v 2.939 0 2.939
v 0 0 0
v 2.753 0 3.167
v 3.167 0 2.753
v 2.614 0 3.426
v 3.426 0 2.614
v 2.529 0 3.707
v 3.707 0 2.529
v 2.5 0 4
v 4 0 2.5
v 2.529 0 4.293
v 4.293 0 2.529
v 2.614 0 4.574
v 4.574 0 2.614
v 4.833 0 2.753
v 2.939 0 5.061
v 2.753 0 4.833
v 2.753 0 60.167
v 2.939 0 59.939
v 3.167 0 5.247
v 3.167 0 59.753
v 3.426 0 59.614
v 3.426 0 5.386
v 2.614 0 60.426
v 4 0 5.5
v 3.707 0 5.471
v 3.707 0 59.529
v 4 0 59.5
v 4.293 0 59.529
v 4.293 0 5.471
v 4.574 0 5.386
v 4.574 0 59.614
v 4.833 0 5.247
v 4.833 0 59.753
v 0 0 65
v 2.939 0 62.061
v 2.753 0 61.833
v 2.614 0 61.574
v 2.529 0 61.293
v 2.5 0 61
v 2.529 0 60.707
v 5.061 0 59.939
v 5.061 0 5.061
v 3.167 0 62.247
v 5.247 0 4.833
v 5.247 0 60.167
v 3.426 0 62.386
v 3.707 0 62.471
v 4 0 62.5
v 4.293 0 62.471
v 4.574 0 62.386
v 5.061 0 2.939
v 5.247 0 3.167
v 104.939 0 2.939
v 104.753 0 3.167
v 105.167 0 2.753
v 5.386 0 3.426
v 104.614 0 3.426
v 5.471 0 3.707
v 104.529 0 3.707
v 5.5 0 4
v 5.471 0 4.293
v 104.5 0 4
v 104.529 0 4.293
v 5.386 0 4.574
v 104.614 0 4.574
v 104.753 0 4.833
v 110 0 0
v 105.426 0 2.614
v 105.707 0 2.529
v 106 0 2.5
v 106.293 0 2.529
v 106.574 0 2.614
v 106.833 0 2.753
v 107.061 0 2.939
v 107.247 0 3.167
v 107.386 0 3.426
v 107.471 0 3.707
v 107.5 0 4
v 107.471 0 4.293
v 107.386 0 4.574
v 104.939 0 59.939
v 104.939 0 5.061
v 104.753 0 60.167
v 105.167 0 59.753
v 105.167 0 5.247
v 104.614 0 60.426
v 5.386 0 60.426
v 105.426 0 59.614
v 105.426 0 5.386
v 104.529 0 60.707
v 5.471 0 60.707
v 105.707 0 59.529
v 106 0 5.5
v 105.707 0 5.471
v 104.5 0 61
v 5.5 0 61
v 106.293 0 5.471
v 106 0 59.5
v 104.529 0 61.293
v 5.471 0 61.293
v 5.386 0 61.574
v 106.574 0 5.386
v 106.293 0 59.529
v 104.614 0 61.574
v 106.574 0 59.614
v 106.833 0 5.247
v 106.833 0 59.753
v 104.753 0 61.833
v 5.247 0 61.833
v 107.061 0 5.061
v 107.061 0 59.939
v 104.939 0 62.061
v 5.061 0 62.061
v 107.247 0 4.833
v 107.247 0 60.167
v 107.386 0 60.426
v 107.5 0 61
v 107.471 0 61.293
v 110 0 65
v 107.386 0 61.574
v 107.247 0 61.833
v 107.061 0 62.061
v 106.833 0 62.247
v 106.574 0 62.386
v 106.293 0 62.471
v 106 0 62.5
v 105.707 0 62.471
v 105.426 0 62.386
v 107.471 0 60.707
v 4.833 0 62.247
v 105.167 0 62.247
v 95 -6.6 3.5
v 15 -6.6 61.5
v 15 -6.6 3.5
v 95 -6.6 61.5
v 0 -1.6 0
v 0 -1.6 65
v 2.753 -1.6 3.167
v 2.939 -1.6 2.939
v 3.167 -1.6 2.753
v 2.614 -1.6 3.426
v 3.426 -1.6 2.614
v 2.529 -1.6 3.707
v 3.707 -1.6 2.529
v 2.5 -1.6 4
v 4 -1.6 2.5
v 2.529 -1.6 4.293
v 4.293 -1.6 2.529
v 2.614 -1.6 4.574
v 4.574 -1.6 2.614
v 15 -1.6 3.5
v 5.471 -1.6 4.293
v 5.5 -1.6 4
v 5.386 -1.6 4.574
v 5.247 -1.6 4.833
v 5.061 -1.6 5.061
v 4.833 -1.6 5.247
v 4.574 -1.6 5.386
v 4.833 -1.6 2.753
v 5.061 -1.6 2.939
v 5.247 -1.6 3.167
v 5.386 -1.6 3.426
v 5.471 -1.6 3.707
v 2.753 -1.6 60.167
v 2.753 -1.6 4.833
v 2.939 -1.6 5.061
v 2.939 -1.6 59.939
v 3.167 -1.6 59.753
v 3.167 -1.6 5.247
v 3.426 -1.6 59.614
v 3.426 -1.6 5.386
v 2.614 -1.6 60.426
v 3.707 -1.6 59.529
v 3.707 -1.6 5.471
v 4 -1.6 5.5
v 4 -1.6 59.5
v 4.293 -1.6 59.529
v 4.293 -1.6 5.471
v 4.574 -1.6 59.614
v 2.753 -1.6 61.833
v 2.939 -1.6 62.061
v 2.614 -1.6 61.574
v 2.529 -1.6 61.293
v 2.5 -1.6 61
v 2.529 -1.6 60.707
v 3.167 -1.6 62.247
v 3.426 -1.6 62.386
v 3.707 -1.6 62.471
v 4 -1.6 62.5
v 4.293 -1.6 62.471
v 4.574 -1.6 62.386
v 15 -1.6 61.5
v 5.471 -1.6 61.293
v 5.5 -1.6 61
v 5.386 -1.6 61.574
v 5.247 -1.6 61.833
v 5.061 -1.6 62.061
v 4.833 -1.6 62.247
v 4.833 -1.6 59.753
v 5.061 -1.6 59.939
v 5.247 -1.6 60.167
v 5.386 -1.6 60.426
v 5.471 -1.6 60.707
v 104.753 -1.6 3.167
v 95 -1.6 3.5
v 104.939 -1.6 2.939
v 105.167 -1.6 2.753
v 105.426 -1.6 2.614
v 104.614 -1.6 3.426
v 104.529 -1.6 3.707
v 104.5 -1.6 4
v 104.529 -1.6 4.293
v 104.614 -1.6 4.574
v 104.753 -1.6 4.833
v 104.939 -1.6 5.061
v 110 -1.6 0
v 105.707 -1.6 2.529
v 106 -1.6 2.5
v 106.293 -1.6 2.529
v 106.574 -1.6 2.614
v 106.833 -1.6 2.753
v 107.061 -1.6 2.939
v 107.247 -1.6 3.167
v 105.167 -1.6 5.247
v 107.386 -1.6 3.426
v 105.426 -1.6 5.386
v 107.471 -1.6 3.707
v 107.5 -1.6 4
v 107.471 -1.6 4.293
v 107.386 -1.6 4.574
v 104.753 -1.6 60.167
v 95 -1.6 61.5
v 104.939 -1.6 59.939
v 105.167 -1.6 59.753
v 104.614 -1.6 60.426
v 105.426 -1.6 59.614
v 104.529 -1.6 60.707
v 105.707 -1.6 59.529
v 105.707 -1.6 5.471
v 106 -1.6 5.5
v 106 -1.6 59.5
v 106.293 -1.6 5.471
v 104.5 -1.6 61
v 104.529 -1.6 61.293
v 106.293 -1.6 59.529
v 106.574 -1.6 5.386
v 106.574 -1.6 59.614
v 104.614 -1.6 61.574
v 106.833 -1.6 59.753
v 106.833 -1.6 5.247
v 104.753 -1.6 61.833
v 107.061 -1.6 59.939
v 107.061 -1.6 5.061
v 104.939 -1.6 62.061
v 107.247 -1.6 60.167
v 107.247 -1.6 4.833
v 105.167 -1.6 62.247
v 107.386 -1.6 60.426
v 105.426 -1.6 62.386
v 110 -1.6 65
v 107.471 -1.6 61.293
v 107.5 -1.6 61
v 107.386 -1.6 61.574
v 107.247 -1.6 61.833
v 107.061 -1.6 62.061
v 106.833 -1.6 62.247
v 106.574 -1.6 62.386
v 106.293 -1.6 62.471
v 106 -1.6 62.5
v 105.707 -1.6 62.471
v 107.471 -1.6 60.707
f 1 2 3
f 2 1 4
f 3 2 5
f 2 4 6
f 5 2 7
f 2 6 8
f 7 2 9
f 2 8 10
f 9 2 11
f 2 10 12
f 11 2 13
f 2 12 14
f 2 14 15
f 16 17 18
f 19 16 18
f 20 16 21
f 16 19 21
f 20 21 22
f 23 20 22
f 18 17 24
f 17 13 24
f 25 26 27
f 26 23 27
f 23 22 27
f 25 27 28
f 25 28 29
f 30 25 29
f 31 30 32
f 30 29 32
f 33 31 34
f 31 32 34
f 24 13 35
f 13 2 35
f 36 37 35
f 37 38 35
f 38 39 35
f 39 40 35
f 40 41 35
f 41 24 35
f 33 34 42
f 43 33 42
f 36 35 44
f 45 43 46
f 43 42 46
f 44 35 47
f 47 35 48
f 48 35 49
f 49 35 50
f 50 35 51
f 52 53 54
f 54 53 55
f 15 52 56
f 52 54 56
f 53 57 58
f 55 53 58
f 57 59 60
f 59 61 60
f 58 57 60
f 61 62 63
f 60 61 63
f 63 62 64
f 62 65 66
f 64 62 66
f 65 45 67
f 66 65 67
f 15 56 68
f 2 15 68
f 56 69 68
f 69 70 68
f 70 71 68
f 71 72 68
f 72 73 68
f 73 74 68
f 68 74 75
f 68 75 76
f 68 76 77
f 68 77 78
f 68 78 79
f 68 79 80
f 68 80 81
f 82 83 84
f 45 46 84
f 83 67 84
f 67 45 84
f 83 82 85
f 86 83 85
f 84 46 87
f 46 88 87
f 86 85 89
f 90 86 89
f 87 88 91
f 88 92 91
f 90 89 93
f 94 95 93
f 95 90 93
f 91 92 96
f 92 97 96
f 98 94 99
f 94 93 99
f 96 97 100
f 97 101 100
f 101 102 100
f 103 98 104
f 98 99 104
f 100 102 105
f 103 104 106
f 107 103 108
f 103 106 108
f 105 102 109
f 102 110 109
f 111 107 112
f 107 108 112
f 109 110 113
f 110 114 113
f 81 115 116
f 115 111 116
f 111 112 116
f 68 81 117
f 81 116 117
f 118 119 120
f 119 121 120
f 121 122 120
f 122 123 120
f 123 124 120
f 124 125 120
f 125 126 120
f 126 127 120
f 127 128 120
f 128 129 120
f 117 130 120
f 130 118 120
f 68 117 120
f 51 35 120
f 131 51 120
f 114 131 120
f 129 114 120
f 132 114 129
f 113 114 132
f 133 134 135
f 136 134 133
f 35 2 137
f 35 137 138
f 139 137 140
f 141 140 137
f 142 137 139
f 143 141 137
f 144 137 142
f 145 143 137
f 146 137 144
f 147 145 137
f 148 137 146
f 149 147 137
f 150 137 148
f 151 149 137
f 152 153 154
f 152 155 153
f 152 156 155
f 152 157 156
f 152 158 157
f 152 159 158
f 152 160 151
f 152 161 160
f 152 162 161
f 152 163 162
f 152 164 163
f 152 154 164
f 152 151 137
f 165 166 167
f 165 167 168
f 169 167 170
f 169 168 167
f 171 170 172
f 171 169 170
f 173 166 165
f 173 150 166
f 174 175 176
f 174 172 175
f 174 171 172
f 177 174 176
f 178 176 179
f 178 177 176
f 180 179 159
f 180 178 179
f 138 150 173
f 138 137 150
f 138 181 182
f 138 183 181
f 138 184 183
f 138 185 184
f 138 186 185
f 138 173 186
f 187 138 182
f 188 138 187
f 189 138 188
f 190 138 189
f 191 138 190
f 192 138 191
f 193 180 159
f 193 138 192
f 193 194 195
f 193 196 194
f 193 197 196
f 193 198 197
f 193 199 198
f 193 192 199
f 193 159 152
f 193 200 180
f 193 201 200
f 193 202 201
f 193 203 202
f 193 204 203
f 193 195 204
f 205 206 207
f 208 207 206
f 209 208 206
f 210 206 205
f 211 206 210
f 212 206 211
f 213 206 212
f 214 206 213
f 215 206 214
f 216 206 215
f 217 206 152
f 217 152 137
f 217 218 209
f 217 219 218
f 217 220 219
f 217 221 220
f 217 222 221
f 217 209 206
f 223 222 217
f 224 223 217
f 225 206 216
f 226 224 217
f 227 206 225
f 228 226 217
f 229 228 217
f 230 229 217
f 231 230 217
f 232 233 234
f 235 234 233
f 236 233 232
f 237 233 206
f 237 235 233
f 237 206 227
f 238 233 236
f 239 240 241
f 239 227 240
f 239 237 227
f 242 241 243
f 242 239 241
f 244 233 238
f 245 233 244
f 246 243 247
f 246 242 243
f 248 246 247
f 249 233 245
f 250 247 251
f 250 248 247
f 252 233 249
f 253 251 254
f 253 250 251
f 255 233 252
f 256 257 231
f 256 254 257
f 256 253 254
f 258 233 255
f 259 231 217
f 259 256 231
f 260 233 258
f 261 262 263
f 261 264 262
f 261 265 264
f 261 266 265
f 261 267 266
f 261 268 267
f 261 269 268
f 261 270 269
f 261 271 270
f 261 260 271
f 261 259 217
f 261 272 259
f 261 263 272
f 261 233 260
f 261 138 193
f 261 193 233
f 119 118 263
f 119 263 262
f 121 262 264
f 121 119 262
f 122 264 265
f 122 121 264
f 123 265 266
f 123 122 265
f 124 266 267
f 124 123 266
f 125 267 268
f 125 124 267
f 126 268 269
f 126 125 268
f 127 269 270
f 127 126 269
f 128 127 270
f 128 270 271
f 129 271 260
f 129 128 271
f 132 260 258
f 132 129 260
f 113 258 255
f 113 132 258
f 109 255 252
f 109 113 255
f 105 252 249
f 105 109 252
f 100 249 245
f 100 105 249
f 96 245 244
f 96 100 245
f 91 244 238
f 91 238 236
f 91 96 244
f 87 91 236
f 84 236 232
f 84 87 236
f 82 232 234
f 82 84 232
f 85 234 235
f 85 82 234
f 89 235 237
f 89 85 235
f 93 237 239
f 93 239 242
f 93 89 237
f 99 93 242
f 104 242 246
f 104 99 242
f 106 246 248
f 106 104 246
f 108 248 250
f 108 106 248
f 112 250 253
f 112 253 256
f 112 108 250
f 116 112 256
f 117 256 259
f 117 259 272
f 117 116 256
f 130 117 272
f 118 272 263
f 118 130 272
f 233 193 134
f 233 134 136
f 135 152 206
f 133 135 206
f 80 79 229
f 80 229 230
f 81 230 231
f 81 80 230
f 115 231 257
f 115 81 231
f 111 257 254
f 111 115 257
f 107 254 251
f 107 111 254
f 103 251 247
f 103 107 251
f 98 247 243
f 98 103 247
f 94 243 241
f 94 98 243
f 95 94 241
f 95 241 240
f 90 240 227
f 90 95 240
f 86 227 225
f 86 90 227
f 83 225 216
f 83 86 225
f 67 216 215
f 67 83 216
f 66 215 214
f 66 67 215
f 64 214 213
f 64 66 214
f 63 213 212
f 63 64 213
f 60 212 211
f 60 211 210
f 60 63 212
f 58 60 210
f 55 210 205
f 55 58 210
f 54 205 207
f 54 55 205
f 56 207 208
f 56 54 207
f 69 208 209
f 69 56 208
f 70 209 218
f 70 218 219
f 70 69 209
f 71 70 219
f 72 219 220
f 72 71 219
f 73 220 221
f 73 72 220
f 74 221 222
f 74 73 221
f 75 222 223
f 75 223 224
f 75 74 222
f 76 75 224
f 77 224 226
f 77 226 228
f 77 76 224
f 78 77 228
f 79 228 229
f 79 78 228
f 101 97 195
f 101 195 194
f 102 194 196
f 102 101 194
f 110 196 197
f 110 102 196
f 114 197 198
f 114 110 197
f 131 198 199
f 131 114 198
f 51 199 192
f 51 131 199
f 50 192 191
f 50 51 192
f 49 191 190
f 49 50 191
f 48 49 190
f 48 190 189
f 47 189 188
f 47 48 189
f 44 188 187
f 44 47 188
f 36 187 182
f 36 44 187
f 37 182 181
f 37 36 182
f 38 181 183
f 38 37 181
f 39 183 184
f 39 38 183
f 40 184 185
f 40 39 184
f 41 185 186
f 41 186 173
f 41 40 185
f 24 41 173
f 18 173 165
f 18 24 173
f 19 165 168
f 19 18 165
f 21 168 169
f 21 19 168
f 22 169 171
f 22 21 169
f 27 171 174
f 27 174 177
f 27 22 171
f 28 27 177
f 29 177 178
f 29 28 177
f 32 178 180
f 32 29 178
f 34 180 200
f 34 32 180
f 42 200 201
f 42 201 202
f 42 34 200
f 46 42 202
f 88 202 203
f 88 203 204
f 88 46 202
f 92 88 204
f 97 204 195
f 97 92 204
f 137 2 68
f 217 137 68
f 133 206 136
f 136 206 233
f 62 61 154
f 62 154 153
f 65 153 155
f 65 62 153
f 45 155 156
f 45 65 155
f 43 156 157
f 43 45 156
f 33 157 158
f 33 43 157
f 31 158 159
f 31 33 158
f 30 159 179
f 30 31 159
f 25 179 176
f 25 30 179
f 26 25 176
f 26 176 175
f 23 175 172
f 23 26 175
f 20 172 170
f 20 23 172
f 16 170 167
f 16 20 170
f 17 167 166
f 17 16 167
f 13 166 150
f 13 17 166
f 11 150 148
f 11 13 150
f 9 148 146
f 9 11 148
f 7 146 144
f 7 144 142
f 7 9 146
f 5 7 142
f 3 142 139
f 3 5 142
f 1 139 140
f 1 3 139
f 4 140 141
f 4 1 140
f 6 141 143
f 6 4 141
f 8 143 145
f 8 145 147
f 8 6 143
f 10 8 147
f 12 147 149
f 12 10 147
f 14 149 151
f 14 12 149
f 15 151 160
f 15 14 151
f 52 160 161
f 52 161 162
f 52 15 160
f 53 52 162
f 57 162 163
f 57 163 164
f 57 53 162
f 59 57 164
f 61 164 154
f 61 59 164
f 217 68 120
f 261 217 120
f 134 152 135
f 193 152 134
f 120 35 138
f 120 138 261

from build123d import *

# Parameters (mm, degrees)
F0_W     = 110
F0_H     = 65
F0_R     = 1.5
F1_DEPTH = 1.6
F2_W     = 80
F2_H     = 58
F3_DEPTH = 5


with BuildPart() as f1:
    # F0 (on Front) → F1 (new body)
    with BuildSketch(Plane.XZ):
        with Locations((55, 32.5)):
            Rectangle(F0_W, F0_H)
        with Locations((4, 4)):
            Circle(F0_R, mode=Mode.SUBTRACT)
        with Locations((106, 4)):
            Circle(F0_R, mode=Mode.SUBTRACT)
        with Locations((4, 61)):
            Circle(F0_R, mode=Mode.SUBTRACT)
        with Locations((106, 61)):
            Circle(F0_R, mode=Mode.SUBTRACT)
    extrude(amount=F1_DEPTH)

    # F2 (on face) → F3 (join)
    with BuildSketch(Plane.XZ.offset(1.6)):
        with Locations((55, 32.5)):
            Rectangle(F2_W, F2_H)
    extrude(amount=F3_DEPTH)


solid = f1.part
